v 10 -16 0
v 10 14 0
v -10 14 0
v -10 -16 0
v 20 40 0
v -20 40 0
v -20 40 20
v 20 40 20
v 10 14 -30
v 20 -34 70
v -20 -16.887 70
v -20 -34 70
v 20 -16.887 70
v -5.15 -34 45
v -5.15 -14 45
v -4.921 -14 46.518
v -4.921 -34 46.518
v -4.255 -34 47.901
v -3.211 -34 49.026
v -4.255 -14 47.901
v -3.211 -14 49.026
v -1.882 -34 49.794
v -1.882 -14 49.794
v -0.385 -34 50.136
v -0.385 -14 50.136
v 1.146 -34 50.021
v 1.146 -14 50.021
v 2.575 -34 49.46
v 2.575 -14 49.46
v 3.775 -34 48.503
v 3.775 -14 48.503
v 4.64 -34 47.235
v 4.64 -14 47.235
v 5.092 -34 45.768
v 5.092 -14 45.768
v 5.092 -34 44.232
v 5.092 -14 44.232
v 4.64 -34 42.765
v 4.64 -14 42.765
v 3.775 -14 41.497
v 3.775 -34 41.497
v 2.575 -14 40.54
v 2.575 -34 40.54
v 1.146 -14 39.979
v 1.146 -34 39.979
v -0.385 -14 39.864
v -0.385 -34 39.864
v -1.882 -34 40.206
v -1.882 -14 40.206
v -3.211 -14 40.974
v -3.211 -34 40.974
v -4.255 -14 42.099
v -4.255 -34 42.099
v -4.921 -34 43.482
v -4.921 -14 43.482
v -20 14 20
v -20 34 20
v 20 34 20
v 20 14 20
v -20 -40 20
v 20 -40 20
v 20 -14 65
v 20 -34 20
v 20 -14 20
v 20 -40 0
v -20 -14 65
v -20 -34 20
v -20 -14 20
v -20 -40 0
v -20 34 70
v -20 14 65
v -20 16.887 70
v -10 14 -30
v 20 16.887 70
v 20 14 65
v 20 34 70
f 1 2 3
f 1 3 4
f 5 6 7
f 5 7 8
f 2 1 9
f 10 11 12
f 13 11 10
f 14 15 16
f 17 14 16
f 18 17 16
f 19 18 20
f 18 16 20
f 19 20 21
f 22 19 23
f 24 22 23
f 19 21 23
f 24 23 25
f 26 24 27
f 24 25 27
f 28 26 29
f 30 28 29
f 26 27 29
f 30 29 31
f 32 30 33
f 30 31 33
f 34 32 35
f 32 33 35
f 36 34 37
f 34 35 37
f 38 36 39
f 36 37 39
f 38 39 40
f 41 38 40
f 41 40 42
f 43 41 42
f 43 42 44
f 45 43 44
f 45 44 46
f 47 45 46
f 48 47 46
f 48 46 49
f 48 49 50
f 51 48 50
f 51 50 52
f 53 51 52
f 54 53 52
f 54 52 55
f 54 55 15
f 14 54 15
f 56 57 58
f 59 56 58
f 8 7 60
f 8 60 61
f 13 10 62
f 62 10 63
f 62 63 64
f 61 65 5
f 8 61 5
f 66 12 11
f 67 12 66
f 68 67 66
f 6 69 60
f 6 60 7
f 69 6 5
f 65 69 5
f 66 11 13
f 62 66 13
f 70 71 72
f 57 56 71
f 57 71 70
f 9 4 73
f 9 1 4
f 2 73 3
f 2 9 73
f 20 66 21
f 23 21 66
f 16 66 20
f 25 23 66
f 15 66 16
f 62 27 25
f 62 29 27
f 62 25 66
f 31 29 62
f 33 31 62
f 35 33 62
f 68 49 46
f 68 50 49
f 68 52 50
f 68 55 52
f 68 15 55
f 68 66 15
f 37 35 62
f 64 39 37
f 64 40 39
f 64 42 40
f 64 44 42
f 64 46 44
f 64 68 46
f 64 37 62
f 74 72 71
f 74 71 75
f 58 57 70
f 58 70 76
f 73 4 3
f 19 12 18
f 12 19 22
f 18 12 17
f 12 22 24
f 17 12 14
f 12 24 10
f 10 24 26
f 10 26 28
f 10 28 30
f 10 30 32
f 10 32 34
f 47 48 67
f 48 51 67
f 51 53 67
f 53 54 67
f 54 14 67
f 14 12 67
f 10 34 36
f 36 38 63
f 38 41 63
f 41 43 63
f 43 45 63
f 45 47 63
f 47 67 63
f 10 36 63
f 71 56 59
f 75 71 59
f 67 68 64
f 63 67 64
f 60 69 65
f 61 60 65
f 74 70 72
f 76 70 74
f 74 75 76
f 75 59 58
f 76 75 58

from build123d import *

# Parameters (mm, degrees)
F0_W     = 40
F0_H     = 80
F1_DEPTH = 20
F2_W     = 40
F2_H     = 20
F3_DEPTH = 50
F5_DEPTH = 10
F7_D     = 10.3
F7_DEPTH = 26.5
F7_TIP   = 3.094432188
F8_SIZE2 = 2.8867513459
F8_SIZE  = 5
F9_SIZE2 = 2.8867513459
F9_SIZE  = 5


with BuildPart() as f1:
    # F0 (on Top) → F1 (new body)
    with BuildSketch(Plane.XY):
        Rectangle(F0_W, F0_H)
    extrude(amount=F1_DEPTH)


with BuildPart() as f3:
    # F2 (on face) → F3 (new body)
    with BuildSketch(Plane.XY.offset(20)):
        with Locations((0, -24)):
            Rectangle(F2_W, F2_H)
    extrude(amount=F3_DEPTH)

    # F7
    with Locations(Plane.XZ.offset(34)):
        with Locations((0, 45)):
            Hole(F7_D / 2, depth=F7_DEPTH)
            with Locations((0, 0, -(F7_DEPTH + F7_TIP / 2))):  # 118° drill point
                Cone(0, F7_D / 2, F7_TIP, mode=Mode.SUBTRACT)

    # F9
    f9_edges = [f3.edges().sort_by_distance(p)[0] for p in [
        (0, -14, 70),
    ]]
    f9_side = f3.faces().sort_by_distance((19.359688, -14, 45))[0]
    chamfer(f9_edges, length=F9_SIZE, length2=F9_SIZE2, reference=f9_side)


with BuildPart() as f3b:
    # F2 (on face) → F3, piece 2 (new body)
    with BuildSketch(Plane.XY.offset(20)):
        with Locations((0, 24)):
            Rectangle(F2_W, F2_H)
    extrude(amount=F3_DEPTH)

    # F8
    f8_edges = [f3b.edges().sort_by_distance(p)[0] for p in [
        (0, 14, 70),
    ]]
    f8_side = f3b.faces().sort_by_distance((0, 14, 45))[0]
    chamfer(f8_edges, length=F8_SIZE, length2=F8_SIZE2, reference=f8_side)


with BuildPart() as f5:
    # F4 (on Right) → F5 (new body, symmetric)
    with BuildSketch(Plane.YZ):
        Polygon((14, -30), (14, 0), (-16, 0), align=None)
    extrude(amount=F5_DEPTH, both=True)


solid = Compound([f1.part, f3.part, f3b.part, f5.part])
